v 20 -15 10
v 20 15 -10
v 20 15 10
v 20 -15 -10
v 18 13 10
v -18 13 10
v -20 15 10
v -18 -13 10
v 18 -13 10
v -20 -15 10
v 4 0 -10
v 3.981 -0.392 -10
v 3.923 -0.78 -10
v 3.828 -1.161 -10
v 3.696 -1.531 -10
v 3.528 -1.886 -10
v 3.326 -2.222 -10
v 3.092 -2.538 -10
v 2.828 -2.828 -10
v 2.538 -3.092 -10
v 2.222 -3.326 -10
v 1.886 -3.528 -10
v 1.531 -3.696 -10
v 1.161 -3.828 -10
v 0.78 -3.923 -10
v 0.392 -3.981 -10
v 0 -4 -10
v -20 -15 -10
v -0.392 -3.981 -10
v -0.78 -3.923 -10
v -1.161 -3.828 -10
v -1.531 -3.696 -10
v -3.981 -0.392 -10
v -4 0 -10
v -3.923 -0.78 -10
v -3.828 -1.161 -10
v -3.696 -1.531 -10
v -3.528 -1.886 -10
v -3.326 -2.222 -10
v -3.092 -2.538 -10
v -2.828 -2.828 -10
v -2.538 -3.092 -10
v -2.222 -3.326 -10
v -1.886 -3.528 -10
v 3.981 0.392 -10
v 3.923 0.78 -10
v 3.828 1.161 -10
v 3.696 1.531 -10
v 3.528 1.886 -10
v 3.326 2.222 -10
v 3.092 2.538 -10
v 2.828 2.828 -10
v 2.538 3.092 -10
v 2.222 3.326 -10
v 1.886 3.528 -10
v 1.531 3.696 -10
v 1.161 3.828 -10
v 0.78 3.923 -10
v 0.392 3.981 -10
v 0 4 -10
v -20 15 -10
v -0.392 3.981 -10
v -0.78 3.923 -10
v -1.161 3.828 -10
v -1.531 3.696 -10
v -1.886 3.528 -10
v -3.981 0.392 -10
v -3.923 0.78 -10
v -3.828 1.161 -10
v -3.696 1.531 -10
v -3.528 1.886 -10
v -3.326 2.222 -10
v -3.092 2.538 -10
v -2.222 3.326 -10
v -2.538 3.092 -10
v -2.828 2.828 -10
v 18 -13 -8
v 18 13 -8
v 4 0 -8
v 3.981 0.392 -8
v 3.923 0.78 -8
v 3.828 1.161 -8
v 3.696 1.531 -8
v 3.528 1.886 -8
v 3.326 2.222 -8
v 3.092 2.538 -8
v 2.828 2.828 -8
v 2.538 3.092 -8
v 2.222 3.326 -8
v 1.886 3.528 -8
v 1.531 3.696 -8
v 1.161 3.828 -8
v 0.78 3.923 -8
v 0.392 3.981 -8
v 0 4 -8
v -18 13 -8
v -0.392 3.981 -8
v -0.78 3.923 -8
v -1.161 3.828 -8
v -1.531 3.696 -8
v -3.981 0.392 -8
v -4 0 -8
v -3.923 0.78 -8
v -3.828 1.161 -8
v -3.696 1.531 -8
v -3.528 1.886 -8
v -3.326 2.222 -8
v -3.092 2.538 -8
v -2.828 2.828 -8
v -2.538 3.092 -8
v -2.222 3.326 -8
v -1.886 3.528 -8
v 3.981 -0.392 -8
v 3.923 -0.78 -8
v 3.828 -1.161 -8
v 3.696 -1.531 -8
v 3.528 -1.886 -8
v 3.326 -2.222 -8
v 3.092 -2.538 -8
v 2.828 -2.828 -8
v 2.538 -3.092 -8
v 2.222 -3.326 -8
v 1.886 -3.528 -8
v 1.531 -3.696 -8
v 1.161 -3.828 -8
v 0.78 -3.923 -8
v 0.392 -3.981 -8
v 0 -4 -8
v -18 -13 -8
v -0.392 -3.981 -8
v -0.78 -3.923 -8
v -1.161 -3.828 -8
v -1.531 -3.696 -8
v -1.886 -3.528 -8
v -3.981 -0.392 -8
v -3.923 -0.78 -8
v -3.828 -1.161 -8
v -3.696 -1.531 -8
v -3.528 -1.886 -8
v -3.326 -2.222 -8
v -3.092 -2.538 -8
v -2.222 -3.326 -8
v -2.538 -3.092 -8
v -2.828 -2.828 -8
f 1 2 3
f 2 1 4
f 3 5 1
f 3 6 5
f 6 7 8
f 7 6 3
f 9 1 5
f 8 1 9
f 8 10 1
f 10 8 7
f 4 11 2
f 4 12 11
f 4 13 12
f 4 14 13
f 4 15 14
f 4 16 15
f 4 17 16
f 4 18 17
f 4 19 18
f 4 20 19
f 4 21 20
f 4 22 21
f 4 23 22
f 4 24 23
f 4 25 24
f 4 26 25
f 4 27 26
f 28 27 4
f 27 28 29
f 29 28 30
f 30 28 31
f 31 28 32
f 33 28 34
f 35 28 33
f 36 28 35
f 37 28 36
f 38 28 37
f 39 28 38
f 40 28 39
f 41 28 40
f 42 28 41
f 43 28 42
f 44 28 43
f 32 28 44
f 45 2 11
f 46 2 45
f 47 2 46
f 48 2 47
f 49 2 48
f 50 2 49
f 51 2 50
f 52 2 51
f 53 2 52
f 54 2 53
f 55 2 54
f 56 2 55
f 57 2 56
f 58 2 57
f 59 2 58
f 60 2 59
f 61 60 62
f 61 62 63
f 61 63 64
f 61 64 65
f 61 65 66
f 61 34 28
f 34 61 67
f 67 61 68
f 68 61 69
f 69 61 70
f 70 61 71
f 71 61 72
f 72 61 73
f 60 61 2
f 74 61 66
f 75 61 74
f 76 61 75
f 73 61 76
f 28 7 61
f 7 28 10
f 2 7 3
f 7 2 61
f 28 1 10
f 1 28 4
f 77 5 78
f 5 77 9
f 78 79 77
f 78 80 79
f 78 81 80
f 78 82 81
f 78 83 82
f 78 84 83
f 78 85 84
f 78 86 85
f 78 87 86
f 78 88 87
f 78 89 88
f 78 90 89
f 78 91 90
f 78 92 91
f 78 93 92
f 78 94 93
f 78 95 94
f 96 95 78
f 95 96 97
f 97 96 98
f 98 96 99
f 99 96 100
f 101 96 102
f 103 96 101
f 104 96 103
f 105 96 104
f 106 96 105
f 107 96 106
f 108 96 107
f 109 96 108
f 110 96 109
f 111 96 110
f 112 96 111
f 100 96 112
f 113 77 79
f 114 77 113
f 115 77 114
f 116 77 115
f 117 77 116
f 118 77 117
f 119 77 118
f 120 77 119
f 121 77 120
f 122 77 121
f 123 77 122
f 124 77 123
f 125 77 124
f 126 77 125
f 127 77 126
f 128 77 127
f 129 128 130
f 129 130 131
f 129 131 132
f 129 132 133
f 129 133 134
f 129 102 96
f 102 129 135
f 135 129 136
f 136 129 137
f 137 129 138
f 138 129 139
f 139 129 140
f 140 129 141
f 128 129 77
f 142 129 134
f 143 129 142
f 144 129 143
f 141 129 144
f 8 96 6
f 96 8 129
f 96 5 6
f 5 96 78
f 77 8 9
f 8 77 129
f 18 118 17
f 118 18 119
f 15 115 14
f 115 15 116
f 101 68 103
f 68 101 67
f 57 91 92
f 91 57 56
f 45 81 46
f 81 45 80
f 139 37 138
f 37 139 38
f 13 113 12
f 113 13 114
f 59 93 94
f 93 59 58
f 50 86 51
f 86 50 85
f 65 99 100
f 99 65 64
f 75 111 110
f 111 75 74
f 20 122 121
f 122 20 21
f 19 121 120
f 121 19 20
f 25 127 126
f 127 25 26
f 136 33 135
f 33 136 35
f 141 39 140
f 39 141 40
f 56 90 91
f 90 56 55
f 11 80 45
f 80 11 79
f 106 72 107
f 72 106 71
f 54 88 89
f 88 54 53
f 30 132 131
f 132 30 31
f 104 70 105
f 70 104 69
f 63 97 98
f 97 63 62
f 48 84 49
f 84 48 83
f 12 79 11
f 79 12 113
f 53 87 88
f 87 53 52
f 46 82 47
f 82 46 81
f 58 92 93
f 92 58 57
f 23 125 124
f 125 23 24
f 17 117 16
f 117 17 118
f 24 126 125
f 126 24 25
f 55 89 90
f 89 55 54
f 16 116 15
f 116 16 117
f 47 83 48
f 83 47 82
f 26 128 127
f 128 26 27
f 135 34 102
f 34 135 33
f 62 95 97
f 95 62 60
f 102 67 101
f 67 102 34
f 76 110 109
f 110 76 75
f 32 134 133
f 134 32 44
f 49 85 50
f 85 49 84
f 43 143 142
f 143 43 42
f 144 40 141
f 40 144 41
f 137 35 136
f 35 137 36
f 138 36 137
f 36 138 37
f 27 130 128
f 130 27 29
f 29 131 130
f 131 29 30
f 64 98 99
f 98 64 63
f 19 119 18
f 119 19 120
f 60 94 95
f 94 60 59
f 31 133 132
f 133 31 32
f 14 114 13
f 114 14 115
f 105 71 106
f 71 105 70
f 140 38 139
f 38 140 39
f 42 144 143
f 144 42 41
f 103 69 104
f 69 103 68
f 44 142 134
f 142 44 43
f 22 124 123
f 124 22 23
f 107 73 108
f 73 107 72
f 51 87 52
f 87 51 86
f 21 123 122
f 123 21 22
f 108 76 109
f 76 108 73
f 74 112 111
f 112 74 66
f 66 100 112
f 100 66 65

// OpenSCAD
// OpenSCAD parametric part skeleton — text-to-cad skill (OPTIONAL backend).
// Render headless (requires openscad binary/AppImage):
//   openscad -o part.stl part.scad
//   openscad -o view.png --camera=0,0,0,55,0,25,140 --imgsize=600,600 part.scad
// Edit the PARAMS block to iterate.

/* [PARAMS] */
length = 40;   // X (mm)
width  = 30;   // Y (mm)
height = 20;   // Z (mm)
wall   = 2;    // wall thickness (mm)
hole_d = 8;    // hole diameter (mm)

$fn = 64;      // circle facet count — raise for smoother holes

// ============================ MODEL ============================
module part() {
    difference() {
        // hollow box, open top
        difference() {
            cube([length, width, height], center = true);
            translate([0, 0, wall])
                cube([length - 2*wall, width - 2*wall, height], center = true);
        }
        // hole through the top
        translate([0, 0, 0])
            cylinder(h = height * 2, d = hole_d, center = true);
    }
}

part();
// ===============================================================
// Pitfall reminder: OpenSCAD has weak fillets (use minkowski() sparingly — slow).
// For real fillets/chamfers or STEP export, prefer the CadQuery template.
